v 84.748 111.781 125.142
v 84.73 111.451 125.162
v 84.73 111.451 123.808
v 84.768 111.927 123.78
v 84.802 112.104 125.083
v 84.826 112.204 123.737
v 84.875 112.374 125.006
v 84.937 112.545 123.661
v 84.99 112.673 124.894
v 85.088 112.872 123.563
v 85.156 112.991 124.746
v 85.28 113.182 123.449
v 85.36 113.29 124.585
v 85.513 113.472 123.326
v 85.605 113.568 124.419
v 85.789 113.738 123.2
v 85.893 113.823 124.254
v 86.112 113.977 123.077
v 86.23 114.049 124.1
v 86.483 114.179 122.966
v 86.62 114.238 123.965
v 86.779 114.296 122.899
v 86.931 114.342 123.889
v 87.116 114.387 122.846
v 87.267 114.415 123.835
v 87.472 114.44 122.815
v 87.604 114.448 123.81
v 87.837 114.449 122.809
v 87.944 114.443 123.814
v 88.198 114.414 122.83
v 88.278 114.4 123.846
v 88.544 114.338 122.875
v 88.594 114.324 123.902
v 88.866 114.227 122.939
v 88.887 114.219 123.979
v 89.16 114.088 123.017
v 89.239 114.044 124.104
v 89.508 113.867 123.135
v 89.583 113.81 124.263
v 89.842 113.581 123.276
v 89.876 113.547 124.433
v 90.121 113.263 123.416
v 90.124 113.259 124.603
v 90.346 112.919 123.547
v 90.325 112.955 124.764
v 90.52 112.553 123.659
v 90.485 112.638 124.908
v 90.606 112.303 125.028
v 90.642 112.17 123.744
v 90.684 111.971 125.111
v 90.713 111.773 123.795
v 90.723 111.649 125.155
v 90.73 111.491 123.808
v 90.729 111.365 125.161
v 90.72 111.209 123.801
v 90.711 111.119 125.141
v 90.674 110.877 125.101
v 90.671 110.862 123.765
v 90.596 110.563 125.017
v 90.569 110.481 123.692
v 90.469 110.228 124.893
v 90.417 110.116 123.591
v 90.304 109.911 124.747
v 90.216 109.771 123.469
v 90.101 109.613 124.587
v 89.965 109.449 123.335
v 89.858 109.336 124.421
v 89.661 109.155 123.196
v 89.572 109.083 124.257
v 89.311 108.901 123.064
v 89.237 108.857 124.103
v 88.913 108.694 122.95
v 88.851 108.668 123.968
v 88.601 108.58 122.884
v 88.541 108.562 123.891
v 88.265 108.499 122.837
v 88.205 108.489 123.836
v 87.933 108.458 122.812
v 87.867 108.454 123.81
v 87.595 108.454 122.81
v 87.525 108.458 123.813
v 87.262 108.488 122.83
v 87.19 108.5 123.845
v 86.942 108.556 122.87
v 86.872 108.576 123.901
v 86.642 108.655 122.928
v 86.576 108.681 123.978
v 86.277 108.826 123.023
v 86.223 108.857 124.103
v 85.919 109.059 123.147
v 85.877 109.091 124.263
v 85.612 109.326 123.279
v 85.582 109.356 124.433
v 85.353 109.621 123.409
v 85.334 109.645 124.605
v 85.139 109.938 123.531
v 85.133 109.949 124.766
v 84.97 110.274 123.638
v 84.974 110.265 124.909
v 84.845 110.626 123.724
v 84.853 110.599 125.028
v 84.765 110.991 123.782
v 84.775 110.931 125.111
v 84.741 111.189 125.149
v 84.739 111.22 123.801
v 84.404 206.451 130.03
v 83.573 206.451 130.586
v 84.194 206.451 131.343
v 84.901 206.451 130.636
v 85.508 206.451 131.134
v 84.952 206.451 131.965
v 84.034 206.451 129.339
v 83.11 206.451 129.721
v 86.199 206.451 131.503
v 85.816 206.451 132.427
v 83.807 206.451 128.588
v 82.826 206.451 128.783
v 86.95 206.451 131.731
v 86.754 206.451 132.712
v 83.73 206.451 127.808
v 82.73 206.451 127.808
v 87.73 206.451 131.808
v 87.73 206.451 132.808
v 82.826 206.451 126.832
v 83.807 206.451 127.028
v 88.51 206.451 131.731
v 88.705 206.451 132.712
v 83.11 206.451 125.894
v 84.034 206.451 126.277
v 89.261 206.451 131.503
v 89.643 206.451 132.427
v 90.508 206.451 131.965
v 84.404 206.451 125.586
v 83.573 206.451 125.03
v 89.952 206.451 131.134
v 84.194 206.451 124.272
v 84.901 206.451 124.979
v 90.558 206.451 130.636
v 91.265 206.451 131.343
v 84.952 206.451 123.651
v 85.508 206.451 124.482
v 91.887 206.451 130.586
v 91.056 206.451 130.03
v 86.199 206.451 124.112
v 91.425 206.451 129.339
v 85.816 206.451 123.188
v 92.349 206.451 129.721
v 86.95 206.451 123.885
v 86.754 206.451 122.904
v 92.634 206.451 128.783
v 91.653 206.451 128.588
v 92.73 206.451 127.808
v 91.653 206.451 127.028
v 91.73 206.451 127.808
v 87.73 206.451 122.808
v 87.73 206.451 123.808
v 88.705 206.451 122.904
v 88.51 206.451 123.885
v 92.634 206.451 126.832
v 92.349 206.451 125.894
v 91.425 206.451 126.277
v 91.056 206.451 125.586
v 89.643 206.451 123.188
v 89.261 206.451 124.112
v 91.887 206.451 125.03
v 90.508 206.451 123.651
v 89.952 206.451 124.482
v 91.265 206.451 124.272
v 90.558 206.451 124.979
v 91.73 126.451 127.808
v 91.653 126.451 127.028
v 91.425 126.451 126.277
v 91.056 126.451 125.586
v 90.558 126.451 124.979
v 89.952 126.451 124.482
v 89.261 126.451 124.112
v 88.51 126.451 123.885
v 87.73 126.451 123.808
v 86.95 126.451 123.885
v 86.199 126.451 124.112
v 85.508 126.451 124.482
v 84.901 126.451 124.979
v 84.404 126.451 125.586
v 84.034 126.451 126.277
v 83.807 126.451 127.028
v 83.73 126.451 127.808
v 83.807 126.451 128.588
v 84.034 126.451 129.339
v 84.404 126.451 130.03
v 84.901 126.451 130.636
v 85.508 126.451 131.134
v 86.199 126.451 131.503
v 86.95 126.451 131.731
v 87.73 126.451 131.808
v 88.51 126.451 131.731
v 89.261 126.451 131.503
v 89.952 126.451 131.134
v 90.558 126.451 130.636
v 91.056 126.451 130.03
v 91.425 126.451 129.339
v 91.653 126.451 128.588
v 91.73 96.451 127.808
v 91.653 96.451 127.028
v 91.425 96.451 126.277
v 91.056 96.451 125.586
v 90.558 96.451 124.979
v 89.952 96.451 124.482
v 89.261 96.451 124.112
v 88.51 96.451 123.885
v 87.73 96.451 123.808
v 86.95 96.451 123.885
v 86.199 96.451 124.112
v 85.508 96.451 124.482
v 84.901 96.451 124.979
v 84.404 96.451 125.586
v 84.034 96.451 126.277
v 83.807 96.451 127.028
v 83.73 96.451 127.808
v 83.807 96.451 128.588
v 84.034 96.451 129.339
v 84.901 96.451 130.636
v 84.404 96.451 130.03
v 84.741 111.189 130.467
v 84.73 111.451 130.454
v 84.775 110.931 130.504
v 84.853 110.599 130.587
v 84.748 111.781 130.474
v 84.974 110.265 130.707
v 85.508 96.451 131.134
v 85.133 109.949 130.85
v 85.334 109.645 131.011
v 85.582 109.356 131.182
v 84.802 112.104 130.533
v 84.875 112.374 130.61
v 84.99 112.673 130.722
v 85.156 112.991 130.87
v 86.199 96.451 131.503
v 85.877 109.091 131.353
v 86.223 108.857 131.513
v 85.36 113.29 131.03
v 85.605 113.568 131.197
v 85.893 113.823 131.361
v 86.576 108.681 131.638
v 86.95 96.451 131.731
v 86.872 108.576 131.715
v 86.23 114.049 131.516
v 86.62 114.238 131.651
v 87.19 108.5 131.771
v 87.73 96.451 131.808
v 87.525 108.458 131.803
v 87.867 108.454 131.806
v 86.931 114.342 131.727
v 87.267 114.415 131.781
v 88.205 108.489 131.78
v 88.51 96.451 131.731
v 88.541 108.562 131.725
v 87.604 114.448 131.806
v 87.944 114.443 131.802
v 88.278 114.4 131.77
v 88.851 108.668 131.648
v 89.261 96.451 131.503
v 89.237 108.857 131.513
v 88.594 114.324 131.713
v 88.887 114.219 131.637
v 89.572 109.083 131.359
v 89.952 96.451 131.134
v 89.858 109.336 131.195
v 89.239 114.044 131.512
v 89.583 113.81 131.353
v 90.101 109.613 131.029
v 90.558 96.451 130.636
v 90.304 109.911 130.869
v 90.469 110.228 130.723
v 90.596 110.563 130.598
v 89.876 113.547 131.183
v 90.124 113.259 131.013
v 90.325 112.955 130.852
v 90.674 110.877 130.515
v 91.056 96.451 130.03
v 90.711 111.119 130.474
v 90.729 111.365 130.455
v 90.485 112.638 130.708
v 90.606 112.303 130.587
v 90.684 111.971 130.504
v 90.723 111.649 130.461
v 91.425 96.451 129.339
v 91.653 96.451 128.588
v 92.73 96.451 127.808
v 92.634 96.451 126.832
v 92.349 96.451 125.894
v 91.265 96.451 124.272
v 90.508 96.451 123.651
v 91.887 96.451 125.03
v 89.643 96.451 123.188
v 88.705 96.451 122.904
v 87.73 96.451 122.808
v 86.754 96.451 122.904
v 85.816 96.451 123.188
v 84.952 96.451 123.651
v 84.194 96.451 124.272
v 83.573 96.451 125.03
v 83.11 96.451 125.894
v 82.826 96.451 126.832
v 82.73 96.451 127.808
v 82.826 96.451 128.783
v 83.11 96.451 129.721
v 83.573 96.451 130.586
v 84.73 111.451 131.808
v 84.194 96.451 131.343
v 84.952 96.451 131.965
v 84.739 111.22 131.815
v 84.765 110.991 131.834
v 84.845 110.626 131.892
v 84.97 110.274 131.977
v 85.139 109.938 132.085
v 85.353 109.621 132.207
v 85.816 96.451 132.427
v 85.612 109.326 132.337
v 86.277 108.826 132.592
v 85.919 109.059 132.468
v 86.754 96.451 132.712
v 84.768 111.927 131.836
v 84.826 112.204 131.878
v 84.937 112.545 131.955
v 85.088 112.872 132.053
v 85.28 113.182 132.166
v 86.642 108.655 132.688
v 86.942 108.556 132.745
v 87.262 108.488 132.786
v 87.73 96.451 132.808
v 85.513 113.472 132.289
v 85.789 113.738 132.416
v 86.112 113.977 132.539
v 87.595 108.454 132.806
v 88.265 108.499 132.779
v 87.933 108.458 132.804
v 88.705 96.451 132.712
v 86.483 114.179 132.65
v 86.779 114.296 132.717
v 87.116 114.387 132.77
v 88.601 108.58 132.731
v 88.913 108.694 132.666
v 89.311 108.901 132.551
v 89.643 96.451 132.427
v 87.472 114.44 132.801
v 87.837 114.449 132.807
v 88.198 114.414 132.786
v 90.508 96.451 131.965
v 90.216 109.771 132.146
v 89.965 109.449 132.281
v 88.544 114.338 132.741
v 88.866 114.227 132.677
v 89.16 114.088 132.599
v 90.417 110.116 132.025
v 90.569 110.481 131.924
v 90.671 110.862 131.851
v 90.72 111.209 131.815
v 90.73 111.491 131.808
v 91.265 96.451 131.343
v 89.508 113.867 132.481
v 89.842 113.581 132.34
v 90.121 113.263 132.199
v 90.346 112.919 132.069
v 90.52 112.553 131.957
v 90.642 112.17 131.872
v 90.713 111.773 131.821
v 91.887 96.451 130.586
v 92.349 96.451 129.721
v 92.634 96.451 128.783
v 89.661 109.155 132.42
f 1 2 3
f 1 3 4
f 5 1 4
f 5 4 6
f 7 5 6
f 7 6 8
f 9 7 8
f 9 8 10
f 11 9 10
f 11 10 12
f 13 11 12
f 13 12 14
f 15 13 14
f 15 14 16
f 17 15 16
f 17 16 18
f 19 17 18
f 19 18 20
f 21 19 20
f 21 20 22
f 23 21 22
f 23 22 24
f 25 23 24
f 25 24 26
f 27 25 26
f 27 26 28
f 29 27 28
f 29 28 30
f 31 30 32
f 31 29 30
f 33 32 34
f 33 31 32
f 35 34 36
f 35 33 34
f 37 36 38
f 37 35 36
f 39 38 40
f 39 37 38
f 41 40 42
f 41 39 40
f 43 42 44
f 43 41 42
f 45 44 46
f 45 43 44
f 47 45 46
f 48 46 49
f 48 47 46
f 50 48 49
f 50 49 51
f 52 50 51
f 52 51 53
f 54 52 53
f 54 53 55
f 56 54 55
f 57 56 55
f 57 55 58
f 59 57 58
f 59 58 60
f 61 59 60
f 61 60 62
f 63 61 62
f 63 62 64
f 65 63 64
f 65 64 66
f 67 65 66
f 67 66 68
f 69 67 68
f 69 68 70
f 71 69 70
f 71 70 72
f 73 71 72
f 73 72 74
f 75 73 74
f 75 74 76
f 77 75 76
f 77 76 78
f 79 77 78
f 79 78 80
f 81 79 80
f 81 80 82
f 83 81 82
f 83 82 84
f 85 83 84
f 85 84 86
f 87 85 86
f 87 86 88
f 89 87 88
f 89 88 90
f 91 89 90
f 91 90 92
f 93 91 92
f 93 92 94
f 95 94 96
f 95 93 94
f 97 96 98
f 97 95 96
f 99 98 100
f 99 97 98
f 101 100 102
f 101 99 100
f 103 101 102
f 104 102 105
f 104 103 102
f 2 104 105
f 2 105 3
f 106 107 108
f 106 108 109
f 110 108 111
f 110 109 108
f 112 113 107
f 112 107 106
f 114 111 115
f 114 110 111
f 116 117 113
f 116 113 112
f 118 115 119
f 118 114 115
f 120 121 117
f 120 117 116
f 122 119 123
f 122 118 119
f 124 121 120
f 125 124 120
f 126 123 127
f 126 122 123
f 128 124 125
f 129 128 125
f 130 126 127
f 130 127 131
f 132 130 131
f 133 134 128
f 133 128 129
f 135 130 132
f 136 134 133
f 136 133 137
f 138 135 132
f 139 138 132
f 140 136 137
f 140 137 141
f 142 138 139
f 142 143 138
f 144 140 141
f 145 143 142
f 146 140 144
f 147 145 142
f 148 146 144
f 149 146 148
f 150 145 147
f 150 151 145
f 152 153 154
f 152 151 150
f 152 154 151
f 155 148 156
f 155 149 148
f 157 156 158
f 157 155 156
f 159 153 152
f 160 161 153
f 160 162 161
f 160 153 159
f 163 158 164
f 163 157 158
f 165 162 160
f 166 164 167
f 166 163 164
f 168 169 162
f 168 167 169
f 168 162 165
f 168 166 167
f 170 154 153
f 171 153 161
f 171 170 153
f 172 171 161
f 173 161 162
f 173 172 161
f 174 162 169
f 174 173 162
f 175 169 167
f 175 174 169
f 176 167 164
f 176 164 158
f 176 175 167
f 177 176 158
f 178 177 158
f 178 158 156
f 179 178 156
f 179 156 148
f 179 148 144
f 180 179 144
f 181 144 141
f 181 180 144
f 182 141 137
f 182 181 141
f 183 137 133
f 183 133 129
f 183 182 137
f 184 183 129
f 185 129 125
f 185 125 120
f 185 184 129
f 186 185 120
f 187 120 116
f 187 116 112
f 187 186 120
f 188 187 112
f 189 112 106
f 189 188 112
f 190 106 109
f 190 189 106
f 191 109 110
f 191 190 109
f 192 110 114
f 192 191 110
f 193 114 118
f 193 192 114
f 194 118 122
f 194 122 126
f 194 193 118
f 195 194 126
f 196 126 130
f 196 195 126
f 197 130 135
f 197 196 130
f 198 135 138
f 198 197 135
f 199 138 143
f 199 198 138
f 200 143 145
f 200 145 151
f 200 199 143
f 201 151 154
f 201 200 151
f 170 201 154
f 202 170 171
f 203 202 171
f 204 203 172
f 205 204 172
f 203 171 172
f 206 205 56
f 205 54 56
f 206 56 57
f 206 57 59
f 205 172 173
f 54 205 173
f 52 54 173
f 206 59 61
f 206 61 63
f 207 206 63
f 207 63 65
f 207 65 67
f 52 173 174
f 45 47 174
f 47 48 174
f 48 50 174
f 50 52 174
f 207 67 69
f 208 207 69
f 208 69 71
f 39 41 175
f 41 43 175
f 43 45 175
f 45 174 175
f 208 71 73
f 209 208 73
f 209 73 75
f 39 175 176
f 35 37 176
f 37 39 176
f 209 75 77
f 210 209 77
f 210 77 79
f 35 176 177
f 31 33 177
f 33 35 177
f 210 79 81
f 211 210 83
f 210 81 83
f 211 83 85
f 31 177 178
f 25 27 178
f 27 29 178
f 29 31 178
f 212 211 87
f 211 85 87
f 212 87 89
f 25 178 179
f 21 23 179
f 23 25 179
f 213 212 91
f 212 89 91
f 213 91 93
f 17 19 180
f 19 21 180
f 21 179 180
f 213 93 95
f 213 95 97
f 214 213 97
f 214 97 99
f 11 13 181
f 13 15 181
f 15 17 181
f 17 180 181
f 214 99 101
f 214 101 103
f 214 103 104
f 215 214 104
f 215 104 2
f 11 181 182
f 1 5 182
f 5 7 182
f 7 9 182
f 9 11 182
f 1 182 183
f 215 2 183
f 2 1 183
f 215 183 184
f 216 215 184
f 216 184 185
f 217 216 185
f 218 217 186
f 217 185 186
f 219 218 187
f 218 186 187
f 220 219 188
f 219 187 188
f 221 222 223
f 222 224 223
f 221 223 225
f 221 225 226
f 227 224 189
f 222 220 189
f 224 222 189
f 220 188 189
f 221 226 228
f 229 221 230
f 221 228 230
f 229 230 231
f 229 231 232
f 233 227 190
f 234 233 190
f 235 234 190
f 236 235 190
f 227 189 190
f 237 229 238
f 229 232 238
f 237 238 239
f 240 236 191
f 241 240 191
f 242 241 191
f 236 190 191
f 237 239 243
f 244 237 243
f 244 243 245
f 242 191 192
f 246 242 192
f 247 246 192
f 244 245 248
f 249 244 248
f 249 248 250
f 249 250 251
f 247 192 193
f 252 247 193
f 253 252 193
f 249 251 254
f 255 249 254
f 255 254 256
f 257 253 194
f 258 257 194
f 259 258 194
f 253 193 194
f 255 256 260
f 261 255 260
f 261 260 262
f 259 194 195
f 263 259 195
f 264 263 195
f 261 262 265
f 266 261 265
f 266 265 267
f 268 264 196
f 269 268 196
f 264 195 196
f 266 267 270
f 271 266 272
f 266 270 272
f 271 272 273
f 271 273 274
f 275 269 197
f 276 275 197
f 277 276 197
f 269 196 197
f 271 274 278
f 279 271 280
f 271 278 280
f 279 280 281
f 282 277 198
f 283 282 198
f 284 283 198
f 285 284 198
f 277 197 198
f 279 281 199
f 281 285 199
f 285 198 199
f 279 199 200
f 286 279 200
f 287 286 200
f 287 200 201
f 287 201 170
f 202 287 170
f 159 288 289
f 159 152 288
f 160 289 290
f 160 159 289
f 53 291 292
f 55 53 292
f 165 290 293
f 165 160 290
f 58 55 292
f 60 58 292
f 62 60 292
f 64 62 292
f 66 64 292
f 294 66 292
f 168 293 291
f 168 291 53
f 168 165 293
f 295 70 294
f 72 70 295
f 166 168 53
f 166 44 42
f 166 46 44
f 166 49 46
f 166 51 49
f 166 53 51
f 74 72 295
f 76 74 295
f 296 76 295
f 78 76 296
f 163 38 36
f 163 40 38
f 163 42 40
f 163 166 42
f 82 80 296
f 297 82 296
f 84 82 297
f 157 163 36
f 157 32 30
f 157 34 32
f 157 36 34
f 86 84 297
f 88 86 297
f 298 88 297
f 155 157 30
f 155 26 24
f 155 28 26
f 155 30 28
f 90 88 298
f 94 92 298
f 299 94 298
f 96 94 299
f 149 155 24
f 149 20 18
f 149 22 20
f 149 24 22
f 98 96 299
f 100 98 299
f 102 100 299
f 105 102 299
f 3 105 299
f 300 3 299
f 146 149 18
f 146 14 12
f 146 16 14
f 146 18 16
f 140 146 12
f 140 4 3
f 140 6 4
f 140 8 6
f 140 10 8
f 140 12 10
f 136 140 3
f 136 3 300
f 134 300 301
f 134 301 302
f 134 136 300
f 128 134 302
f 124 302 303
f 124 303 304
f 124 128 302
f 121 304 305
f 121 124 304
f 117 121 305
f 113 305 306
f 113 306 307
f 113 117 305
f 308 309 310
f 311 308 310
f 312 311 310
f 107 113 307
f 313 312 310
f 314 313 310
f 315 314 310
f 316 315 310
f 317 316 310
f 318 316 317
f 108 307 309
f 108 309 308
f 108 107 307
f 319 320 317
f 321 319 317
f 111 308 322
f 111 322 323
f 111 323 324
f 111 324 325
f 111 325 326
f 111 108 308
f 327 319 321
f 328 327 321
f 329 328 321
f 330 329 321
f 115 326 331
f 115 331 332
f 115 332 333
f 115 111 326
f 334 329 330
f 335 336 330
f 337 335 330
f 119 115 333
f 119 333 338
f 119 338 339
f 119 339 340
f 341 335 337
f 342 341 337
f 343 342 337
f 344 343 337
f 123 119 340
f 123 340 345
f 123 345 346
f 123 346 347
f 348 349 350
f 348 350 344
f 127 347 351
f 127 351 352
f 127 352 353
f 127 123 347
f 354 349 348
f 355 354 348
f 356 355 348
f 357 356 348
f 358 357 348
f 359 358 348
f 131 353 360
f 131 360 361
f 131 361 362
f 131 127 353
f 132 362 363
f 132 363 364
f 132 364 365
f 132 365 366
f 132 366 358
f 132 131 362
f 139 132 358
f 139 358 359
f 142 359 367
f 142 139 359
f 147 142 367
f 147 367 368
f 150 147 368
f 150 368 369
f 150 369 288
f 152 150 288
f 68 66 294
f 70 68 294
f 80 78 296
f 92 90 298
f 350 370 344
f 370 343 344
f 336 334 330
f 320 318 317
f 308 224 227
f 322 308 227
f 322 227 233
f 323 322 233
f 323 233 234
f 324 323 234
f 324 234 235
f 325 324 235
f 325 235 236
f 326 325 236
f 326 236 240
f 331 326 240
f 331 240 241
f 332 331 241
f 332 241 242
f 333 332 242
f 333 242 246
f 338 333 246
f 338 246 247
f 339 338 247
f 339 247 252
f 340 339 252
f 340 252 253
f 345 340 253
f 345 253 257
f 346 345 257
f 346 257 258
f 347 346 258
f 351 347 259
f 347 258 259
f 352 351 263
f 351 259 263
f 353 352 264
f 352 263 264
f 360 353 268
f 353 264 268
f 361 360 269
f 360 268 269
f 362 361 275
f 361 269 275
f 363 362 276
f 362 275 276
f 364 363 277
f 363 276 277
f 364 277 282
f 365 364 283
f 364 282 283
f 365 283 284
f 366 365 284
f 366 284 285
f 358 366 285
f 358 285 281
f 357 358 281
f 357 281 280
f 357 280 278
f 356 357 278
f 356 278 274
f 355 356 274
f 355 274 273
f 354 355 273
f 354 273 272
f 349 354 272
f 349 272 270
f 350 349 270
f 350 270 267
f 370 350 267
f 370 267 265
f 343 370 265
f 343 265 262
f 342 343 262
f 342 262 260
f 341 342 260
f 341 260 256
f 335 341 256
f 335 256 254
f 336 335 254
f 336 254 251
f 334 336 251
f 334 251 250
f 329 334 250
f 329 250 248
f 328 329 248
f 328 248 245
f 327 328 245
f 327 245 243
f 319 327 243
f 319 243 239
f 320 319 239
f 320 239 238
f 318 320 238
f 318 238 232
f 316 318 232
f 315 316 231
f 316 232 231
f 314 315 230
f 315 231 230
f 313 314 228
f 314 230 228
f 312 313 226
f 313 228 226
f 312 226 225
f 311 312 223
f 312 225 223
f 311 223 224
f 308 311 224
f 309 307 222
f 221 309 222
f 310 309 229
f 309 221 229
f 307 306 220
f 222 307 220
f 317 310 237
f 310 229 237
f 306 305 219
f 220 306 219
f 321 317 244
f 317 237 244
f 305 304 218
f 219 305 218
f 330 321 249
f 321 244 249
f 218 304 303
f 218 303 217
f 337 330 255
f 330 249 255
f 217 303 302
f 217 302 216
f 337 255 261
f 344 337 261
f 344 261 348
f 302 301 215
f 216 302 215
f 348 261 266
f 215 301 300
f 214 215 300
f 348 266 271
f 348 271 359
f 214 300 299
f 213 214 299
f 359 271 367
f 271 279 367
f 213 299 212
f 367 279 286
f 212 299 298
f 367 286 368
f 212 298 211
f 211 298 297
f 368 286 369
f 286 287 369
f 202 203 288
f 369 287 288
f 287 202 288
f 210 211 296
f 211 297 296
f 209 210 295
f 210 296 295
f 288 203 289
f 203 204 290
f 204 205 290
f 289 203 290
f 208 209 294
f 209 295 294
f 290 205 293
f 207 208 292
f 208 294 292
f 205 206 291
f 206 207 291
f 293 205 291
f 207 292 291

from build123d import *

# Parameters (mm, degrees)
SKETCH1_R                = 5
SKETCH1_R_2              = 4
BOSS_EXTRUDE1_DEPTH      = 80
BOSS_EXTRUDE1_DEPTH_BACK = 30
SKETCH2_R                = 3
CUT_EXTRUDE1_DEPTH       = 6
CUT_EXTRUDE1_DEPTH_BACK  = 6


with BuildPart() as part:
    # Sketch1 → Boss-Extrude1 (new body, two sides)
    with BuildSketch(Plane(origin=(0, 126.450796526, 0), x_dir=(1, 0, 0), z_dir=(0, 1, 0))) as boss_extrude1_sk:
        with Locations((87.72987116, -127.807872395)):
            Circle(SKETCH1_R)
        with Locations((87.72987116, -127.807872395)):
            Circle(SKETCH1_R_2, mode=Mode.SUBTRACT)
    extrude(amount=BOSS_EXTRUDE1_DEPTH)
    extrude(boss_extrude1_sk.sketch, amount=-BOSS_EXTRUDE1_DEPTH_BACK)

    # Sketch2 → Cut-Extrude1 (cut, two sides)
    with BuildSketch(Plane(origin=(-5.567034038, 0.110667347, 127.807872395), x_dir=(-1, 0, 0), z_dir=(0, 0, -1))) as cut_extrude1_sk:
        with Locations((-93.296905198, 111.340129179)):
            Circle(SKETCH2_R)
    extrude(amount=CUT_EXTRUDE1_DEPTH, mode=Mode.SUBTRACT)
    extrude(cut_extrude1_sk.sketch, amount=-CUT_EXTRUDE1_DEPTH_BACK, mode=Mode.SUBTRACT)


solid = part.part
